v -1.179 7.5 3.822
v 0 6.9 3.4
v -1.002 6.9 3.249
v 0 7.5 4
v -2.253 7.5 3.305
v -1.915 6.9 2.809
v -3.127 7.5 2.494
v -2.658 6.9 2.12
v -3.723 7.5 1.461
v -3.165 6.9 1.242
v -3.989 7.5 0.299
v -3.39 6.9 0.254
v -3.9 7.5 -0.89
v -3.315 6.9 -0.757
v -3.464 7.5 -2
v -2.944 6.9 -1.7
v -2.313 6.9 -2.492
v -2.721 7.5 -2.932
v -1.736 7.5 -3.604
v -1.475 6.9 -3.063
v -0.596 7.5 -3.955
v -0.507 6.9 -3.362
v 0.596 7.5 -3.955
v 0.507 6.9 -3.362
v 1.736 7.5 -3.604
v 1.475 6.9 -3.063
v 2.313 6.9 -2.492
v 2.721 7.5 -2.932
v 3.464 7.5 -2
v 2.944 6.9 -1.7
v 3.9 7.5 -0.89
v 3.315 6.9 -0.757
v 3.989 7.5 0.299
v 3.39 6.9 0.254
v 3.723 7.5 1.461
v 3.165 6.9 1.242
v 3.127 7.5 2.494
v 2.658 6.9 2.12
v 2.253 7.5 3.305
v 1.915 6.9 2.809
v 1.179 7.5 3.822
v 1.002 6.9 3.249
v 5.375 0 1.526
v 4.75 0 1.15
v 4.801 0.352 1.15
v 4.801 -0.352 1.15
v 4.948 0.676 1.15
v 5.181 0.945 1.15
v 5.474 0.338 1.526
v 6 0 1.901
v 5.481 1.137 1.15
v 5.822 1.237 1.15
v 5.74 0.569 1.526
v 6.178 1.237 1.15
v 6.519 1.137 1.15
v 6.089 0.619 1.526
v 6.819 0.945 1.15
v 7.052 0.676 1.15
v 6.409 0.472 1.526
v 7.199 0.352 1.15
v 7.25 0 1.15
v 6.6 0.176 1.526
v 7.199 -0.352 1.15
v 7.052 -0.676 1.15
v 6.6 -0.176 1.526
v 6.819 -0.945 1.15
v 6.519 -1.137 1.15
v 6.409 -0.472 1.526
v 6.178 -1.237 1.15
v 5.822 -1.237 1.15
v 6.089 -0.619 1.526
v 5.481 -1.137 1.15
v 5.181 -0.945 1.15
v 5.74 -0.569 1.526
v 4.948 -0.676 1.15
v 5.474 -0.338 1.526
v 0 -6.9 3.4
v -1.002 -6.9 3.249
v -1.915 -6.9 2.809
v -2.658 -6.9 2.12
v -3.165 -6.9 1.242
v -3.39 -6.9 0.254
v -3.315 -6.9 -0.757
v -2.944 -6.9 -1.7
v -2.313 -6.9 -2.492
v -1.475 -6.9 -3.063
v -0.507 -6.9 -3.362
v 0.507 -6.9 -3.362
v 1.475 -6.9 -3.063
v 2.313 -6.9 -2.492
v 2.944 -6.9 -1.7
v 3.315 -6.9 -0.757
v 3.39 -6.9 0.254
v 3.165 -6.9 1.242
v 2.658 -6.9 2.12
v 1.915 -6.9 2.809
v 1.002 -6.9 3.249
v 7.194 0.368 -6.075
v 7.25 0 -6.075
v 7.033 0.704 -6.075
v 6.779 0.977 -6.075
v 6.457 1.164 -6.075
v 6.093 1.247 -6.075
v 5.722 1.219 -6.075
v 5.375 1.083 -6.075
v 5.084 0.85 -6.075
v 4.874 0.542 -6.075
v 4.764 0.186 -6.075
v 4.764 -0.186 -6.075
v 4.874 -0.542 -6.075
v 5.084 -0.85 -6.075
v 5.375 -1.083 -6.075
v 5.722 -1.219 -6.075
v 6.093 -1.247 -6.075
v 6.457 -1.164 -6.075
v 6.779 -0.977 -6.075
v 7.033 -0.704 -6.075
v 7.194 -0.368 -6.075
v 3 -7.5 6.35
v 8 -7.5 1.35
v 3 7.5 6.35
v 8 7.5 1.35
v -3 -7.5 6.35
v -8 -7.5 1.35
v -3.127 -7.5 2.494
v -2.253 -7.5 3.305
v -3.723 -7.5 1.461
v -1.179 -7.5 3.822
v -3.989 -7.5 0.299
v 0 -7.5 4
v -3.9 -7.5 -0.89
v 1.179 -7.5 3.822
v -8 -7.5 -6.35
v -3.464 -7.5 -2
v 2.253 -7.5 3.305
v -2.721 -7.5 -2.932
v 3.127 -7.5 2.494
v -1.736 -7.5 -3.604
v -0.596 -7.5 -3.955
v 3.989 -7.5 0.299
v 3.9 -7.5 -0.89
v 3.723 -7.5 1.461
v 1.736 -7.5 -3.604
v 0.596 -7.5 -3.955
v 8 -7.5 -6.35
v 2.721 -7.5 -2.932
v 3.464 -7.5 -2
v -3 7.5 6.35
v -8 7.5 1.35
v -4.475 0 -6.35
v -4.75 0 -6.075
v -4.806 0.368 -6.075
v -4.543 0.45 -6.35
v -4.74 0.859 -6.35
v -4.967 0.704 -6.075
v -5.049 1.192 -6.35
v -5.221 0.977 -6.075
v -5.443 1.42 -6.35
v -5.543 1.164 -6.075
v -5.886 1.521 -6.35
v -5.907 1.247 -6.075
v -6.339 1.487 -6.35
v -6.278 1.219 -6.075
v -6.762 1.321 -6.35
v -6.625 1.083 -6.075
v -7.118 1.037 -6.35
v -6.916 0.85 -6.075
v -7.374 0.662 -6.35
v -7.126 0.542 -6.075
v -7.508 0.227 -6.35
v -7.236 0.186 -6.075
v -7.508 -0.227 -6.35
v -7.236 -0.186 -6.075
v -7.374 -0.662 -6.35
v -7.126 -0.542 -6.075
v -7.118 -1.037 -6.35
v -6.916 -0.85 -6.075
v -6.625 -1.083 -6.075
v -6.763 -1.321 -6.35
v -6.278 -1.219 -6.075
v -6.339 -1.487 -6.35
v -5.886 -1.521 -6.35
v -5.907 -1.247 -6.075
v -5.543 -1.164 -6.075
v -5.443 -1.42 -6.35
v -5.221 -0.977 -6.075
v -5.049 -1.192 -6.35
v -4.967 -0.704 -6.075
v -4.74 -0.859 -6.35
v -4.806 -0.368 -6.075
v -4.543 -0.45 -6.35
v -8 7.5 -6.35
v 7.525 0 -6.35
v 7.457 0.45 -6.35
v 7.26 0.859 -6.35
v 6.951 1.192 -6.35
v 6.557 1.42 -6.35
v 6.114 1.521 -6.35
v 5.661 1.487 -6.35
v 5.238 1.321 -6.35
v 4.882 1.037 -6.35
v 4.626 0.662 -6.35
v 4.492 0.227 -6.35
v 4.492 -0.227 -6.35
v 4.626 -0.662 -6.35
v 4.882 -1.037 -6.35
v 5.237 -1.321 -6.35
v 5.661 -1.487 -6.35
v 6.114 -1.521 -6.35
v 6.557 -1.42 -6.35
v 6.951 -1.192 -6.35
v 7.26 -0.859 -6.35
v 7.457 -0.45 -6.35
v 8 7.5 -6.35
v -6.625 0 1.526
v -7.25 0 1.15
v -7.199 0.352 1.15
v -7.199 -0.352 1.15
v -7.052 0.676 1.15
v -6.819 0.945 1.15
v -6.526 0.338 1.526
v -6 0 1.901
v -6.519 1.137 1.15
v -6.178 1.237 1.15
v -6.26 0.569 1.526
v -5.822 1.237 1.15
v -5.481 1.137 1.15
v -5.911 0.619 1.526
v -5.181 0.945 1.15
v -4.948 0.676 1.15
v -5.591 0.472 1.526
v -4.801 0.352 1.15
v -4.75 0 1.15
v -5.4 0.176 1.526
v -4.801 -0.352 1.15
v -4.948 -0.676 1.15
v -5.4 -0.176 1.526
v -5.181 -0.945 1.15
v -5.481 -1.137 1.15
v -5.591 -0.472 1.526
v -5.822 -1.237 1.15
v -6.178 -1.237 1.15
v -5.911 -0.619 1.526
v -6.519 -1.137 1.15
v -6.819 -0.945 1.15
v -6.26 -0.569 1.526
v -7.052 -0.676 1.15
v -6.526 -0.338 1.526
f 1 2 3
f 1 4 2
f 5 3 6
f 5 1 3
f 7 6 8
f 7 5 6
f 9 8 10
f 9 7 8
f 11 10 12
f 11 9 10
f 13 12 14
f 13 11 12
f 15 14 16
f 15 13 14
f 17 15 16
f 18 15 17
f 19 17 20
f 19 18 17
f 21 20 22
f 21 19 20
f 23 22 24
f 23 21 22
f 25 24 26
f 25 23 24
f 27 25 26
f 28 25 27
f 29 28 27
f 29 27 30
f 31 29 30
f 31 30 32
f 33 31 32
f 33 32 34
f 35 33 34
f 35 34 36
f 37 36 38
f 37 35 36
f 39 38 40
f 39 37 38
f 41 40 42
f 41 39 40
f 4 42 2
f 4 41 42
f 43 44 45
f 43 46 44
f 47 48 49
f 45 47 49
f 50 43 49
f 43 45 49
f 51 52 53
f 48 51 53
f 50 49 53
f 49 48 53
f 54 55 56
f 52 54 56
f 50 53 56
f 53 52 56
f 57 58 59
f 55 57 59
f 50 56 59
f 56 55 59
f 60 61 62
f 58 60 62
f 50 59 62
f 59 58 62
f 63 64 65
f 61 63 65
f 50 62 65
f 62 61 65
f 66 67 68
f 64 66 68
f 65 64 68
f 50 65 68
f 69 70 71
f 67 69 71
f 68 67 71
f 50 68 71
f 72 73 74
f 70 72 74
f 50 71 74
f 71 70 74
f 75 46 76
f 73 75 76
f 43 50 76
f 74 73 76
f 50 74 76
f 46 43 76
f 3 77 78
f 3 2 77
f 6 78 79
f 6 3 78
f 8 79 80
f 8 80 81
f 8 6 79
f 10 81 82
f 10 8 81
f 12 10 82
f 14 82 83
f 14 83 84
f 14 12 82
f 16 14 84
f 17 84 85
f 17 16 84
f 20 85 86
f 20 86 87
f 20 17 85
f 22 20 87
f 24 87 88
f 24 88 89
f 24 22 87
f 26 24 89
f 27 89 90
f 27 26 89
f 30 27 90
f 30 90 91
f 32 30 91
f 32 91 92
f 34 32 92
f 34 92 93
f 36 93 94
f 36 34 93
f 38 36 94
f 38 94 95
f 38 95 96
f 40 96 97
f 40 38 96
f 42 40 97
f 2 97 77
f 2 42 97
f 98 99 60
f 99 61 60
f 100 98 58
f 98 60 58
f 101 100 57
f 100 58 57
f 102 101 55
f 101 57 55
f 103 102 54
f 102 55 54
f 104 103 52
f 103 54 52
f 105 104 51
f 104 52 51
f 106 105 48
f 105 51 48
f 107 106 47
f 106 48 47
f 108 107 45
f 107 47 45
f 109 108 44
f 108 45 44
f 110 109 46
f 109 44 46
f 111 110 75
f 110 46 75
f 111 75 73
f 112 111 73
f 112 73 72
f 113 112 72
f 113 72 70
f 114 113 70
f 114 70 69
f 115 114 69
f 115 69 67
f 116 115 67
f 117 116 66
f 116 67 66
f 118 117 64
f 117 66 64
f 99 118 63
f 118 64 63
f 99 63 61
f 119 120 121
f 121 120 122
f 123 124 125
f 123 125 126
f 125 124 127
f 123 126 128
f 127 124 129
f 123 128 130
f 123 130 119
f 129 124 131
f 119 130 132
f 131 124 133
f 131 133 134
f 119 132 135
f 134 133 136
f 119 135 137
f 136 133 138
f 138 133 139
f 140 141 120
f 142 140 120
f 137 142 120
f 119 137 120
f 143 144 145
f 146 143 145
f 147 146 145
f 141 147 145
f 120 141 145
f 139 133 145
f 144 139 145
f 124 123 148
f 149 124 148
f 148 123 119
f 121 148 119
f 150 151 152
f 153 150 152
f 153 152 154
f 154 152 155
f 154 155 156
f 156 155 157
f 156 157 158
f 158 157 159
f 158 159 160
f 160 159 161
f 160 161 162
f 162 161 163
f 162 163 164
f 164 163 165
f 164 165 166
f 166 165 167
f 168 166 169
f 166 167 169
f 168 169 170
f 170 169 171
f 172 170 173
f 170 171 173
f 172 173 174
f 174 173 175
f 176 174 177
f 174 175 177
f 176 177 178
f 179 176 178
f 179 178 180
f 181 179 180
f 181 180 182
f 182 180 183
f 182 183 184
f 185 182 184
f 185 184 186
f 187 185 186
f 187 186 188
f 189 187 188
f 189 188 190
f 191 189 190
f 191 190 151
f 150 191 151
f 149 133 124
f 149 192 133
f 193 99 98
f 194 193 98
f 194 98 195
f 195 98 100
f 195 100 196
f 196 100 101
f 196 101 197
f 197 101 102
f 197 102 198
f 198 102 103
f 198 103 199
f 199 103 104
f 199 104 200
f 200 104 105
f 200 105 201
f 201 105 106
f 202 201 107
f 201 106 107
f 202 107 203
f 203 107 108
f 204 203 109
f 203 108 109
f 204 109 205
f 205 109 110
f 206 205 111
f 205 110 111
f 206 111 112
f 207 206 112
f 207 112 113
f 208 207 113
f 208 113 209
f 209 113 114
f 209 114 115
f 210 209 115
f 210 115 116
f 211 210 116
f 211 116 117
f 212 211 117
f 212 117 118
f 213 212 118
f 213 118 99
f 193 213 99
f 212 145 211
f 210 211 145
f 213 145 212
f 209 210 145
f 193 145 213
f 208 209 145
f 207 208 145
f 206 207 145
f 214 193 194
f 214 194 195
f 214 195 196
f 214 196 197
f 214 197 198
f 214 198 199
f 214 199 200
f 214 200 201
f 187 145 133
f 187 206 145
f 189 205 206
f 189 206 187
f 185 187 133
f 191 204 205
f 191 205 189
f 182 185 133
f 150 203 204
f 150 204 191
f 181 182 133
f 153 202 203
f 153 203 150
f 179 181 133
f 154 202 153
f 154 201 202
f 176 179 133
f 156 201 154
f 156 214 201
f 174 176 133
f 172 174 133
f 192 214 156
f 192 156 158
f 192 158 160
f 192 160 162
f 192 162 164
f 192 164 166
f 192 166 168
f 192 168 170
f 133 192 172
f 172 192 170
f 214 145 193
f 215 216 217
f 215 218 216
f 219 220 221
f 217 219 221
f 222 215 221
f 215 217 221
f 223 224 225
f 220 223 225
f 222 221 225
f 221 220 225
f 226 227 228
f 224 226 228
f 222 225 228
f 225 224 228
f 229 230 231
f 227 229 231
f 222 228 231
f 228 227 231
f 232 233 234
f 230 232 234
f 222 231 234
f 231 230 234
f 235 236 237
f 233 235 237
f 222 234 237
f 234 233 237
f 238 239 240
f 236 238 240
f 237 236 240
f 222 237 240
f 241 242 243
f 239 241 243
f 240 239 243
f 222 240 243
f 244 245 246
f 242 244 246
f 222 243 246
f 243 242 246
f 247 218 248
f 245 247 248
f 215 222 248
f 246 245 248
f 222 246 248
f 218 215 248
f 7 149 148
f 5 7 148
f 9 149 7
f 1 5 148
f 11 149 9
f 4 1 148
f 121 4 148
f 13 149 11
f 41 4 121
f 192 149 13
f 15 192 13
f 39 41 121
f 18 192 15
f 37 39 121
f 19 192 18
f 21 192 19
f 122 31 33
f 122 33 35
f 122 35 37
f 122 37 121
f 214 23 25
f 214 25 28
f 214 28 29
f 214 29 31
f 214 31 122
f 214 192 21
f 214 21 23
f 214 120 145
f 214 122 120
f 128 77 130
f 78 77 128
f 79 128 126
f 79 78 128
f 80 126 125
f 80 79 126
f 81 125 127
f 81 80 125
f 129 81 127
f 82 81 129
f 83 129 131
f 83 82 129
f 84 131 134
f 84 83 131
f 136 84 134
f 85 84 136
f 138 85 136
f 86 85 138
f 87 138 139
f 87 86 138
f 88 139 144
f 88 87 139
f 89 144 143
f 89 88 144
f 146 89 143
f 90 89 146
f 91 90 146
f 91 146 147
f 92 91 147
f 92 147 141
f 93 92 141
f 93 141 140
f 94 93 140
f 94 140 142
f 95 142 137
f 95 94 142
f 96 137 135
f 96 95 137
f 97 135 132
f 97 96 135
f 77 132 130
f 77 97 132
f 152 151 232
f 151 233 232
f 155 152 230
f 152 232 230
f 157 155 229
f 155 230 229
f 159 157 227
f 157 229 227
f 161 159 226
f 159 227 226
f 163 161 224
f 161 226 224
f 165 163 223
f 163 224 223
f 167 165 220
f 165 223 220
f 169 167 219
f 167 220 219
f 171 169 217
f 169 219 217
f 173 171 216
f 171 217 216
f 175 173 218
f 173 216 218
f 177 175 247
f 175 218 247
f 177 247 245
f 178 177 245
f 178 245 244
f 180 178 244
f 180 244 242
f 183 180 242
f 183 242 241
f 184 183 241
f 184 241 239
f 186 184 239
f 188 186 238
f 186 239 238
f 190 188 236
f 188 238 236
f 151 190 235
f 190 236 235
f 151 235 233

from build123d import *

# Parameters (mm, degrees)
RESSALTO_EXTRUS_O1_DEPTH        = 7.5
FURO_ROSCADO_DE_M31_D           = 2.5
FURO_ROSCADO_DE_M31_DEPTH       = 7.5
FURO_ROSCADO_DE_M31_CSINK_D     = 3.05
FURO_ROSCADO_DE_M31_CSINK_ANGLE = 90
FURO_ROSCADO_DE_M31_TIP         = 0.751075774
CHANFRO1_SIZE                   = 5


with BuildPart() as part:
    # Esboço1 → Ressalto-extrusão1 (new, symmetric)
    with BuildSketch(Plane(origin=(0, 0, 0), x_dir=(1, 0, 0), z_dir=(0, 1, 0))):
        Polygon((3.666174209, 6.35), (-3.666174209, 6.35), (-8, 6.35), (-8, -6.35), (8, -6.35), (8, 6.35), align=None)
    extrude(amount=RESSALTO_EXTRUS_O1_DEPTH, both=True)

    # Esboço5 → Furo roscado de M81 (revolve, cut)
    with BuildSketch(Plane(origin=(0, 7.5, 0), x_dir=(0, 0, 1), z_dir=(1, 0, 0))):
        Polygon((0, 0), (0, 15), (4, 15), (3.4, 14.4), (3.4, 0.6), (4, 0), align=None)
    revolve(axis=Axis((0, 13.85, 0), (0, -1, 0)), mode=Mode.SUBTRACT)

    # Furo roscado de M31
    with Locations(Plane(origin=(0, 0, -6.35), x_dir=(-1, 0, 0), z_dir=(0, 0, -1))):
        with Locations((-6, 0), (6, 0)):
            CounterSinkHole(FURO_ROSCADO_DE_M31_D / 2, FURO_ROSCADO_DE_M31_CSINK_D / 2, depth=FURO_ROSCADO_DE_M31_DEPTH, counter_sink_angle=FURO_ROSCADO_DE_M31_CSINK_ANGLE)
            with Locations((0, 0, -(FURO_ROSCADO_DE_M31_DEPTH + FURO_ROSCADO_DE_M31_TIP / 2))):  # 118° drill point
                Cone(0, FURO_ROSCADO_DE_M31_D / 2, FURO_ROSCADO_DE_M31_TIP, mode=Mode.SUBTRACT)

    # Chanfro1
    chanfro1_edges = [part.edges().sort_by_distance(p)[0] for p in [
        (8, 0, 6.35),
        (-8, 0, 6.35),
    ]]
    chamfer(chanfro1_edges, length=CHANFRO1_SIZE)


solid = part.part
